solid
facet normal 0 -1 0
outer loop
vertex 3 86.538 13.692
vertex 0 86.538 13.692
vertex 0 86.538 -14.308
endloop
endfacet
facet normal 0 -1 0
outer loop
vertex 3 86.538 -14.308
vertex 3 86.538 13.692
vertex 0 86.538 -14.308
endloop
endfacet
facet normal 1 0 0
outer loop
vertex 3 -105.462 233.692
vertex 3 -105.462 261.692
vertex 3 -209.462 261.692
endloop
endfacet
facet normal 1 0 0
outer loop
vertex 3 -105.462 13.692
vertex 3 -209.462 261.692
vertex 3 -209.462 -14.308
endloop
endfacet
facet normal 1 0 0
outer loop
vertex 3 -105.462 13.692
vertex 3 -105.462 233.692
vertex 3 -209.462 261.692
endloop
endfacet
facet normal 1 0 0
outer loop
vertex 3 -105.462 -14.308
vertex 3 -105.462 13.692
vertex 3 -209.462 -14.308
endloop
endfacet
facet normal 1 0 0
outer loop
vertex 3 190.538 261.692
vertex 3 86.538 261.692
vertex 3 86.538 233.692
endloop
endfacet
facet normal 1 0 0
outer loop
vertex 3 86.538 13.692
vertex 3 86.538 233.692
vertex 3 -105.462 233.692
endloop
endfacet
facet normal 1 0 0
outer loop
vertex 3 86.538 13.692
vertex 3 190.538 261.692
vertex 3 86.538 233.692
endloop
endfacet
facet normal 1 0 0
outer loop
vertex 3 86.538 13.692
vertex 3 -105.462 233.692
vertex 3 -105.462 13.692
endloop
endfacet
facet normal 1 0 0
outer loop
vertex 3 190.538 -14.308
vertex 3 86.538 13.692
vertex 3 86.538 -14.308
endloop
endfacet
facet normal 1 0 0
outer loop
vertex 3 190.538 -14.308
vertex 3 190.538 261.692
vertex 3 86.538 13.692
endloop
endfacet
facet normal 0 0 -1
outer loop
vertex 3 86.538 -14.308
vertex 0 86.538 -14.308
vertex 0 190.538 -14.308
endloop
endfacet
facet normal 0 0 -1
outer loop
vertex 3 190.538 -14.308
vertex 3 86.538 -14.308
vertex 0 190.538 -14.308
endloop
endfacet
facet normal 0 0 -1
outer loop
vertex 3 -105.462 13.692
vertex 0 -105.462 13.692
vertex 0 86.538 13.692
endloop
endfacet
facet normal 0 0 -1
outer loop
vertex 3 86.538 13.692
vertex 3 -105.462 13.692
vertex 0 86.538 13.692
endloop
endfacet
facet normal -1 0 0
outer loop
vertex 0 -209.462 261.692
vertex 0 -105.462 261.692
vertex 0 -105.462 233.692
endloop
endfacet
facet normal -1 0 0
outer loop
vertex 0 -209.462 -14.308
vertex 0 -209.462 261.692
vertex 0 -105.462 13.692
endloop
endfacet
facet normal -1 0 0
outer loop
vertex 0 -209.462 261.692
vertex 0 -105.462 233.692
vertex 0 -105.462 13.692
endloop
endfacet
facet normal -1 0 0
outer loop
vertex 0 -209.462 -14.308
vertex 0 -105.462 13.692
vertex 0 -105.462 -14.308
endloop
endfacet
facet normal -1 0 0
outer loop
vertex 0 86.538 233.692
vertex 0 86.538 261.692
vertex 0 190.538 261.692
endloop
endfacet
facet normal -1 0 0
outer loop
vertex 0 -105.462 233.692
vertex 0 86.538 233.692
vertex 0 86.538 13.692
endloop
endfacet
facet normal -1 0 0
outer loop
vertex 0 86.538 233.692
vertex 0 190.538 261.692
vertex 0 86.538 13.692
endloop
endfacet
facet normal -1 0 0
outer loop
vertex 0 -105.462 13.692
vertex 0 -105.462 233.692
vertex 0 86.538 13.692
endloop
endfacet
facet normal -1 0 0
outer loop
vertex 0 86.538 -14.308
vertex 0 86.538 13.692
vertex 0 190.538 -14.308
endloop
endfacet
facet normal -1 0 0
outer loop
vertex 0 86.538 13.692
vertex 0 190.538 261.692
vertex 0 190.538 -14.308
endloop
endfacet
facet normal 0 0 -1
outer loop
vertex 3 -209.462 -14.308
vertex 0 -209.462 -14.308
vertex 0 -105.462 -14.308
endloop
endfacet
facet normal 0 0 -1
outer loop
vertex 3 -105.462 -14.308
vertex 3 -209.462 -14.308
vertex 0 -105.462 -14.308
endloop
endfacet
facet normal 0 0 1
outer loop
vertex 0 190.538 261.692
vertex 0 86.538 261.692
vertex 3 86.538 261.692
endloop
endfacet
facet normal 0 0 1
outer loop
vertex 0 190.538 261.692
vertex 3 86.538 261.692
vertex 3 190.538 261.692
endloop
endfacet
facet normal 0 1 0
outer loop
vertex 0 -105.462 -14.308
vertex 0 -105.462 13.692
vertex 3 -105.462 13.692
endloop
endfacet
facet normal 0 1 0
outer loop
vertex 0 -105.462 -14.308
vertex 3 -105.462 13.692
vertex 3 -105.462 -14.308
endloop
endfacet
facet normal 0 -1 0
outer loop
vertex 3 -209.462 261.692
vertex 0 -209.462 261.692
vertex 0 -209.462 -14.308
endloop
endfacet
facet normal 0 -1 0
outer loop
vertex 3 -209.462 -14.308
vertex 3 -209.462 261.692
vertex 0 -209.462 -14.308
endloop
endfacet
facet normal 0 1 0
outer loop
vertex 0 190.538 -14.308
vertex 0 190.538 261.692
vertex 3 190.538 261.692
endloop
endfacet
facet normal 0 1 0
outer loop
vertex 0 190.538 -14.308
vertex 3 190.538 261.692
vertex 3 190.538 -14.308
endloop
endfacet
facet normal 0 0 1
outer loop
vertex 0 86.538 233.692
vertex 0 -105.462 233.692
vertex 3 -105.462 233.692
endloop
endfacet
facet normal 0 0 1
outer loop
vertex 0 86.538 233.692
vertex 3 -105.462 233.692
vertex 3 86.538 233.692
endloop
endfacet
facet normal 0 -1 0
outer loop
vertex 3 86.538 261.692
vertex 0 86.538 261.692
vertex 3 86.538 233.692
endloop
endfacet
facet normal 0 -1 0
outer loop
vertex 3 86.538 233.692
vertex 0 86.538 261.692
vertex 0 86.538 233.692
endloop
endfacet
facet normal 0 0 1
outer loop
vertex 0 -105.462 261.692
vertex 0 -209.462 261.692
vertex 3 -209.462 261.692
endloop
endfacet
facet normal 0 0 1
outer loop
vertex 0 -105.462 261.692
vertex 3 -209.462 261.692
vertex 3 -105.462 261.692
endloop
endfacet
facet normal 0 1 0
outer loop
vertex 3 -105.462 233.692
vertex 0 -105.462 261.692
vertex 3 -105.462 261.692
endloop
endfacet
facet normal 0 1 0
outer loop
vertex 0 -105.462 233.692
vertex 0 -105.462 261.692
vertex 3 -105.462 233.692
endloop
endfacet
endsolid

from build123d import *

# Parameters (mm, degrees)
SKETCH1_W           = 276
SKETCH1_H           = 400
BOSS_EXTRUDE1_DEPTH = 3
SKETCH2_W           = 28
SKETCH2_H           = 192
CUT_EXTRUDE1_DEPTH  = 25


with BuildPart() as part:
    # Sketch1 → Boss-Extrude1 (new body)
    with BuildSketch(Plane(origin=(0, 0, 0), x_dir=(0, 0, -1), z_dir=(1, 0, 0))):
        with Locations((-123.692307692, -9.461538462)):
            Rectangle(SKETCH1_W, SKETCH1_H)
    extrude(amount=BOSS_EXTRUDE1_DEPTH)

    # Sketch2 → Cut-Extrude1 (cut)
    with BuildSketch(Plane(origin=(0, 0, 0), x_dir=(0, 0, -1), z_dir=(1, 0, 0))):
        with Locations((0.307692308, -9.461538462)):
            Rectangle(SKETCH2_W, SKETCH2_H)
        with Locations((-247.692307692, -9.461538462)):
            Rectangle(SKETCH2_W, SKETCH2_H)
    extrude(amount=CUT_EXTRUDE1_DEPTH, mode=Mode.SUBTRACT)


solid = part.part
